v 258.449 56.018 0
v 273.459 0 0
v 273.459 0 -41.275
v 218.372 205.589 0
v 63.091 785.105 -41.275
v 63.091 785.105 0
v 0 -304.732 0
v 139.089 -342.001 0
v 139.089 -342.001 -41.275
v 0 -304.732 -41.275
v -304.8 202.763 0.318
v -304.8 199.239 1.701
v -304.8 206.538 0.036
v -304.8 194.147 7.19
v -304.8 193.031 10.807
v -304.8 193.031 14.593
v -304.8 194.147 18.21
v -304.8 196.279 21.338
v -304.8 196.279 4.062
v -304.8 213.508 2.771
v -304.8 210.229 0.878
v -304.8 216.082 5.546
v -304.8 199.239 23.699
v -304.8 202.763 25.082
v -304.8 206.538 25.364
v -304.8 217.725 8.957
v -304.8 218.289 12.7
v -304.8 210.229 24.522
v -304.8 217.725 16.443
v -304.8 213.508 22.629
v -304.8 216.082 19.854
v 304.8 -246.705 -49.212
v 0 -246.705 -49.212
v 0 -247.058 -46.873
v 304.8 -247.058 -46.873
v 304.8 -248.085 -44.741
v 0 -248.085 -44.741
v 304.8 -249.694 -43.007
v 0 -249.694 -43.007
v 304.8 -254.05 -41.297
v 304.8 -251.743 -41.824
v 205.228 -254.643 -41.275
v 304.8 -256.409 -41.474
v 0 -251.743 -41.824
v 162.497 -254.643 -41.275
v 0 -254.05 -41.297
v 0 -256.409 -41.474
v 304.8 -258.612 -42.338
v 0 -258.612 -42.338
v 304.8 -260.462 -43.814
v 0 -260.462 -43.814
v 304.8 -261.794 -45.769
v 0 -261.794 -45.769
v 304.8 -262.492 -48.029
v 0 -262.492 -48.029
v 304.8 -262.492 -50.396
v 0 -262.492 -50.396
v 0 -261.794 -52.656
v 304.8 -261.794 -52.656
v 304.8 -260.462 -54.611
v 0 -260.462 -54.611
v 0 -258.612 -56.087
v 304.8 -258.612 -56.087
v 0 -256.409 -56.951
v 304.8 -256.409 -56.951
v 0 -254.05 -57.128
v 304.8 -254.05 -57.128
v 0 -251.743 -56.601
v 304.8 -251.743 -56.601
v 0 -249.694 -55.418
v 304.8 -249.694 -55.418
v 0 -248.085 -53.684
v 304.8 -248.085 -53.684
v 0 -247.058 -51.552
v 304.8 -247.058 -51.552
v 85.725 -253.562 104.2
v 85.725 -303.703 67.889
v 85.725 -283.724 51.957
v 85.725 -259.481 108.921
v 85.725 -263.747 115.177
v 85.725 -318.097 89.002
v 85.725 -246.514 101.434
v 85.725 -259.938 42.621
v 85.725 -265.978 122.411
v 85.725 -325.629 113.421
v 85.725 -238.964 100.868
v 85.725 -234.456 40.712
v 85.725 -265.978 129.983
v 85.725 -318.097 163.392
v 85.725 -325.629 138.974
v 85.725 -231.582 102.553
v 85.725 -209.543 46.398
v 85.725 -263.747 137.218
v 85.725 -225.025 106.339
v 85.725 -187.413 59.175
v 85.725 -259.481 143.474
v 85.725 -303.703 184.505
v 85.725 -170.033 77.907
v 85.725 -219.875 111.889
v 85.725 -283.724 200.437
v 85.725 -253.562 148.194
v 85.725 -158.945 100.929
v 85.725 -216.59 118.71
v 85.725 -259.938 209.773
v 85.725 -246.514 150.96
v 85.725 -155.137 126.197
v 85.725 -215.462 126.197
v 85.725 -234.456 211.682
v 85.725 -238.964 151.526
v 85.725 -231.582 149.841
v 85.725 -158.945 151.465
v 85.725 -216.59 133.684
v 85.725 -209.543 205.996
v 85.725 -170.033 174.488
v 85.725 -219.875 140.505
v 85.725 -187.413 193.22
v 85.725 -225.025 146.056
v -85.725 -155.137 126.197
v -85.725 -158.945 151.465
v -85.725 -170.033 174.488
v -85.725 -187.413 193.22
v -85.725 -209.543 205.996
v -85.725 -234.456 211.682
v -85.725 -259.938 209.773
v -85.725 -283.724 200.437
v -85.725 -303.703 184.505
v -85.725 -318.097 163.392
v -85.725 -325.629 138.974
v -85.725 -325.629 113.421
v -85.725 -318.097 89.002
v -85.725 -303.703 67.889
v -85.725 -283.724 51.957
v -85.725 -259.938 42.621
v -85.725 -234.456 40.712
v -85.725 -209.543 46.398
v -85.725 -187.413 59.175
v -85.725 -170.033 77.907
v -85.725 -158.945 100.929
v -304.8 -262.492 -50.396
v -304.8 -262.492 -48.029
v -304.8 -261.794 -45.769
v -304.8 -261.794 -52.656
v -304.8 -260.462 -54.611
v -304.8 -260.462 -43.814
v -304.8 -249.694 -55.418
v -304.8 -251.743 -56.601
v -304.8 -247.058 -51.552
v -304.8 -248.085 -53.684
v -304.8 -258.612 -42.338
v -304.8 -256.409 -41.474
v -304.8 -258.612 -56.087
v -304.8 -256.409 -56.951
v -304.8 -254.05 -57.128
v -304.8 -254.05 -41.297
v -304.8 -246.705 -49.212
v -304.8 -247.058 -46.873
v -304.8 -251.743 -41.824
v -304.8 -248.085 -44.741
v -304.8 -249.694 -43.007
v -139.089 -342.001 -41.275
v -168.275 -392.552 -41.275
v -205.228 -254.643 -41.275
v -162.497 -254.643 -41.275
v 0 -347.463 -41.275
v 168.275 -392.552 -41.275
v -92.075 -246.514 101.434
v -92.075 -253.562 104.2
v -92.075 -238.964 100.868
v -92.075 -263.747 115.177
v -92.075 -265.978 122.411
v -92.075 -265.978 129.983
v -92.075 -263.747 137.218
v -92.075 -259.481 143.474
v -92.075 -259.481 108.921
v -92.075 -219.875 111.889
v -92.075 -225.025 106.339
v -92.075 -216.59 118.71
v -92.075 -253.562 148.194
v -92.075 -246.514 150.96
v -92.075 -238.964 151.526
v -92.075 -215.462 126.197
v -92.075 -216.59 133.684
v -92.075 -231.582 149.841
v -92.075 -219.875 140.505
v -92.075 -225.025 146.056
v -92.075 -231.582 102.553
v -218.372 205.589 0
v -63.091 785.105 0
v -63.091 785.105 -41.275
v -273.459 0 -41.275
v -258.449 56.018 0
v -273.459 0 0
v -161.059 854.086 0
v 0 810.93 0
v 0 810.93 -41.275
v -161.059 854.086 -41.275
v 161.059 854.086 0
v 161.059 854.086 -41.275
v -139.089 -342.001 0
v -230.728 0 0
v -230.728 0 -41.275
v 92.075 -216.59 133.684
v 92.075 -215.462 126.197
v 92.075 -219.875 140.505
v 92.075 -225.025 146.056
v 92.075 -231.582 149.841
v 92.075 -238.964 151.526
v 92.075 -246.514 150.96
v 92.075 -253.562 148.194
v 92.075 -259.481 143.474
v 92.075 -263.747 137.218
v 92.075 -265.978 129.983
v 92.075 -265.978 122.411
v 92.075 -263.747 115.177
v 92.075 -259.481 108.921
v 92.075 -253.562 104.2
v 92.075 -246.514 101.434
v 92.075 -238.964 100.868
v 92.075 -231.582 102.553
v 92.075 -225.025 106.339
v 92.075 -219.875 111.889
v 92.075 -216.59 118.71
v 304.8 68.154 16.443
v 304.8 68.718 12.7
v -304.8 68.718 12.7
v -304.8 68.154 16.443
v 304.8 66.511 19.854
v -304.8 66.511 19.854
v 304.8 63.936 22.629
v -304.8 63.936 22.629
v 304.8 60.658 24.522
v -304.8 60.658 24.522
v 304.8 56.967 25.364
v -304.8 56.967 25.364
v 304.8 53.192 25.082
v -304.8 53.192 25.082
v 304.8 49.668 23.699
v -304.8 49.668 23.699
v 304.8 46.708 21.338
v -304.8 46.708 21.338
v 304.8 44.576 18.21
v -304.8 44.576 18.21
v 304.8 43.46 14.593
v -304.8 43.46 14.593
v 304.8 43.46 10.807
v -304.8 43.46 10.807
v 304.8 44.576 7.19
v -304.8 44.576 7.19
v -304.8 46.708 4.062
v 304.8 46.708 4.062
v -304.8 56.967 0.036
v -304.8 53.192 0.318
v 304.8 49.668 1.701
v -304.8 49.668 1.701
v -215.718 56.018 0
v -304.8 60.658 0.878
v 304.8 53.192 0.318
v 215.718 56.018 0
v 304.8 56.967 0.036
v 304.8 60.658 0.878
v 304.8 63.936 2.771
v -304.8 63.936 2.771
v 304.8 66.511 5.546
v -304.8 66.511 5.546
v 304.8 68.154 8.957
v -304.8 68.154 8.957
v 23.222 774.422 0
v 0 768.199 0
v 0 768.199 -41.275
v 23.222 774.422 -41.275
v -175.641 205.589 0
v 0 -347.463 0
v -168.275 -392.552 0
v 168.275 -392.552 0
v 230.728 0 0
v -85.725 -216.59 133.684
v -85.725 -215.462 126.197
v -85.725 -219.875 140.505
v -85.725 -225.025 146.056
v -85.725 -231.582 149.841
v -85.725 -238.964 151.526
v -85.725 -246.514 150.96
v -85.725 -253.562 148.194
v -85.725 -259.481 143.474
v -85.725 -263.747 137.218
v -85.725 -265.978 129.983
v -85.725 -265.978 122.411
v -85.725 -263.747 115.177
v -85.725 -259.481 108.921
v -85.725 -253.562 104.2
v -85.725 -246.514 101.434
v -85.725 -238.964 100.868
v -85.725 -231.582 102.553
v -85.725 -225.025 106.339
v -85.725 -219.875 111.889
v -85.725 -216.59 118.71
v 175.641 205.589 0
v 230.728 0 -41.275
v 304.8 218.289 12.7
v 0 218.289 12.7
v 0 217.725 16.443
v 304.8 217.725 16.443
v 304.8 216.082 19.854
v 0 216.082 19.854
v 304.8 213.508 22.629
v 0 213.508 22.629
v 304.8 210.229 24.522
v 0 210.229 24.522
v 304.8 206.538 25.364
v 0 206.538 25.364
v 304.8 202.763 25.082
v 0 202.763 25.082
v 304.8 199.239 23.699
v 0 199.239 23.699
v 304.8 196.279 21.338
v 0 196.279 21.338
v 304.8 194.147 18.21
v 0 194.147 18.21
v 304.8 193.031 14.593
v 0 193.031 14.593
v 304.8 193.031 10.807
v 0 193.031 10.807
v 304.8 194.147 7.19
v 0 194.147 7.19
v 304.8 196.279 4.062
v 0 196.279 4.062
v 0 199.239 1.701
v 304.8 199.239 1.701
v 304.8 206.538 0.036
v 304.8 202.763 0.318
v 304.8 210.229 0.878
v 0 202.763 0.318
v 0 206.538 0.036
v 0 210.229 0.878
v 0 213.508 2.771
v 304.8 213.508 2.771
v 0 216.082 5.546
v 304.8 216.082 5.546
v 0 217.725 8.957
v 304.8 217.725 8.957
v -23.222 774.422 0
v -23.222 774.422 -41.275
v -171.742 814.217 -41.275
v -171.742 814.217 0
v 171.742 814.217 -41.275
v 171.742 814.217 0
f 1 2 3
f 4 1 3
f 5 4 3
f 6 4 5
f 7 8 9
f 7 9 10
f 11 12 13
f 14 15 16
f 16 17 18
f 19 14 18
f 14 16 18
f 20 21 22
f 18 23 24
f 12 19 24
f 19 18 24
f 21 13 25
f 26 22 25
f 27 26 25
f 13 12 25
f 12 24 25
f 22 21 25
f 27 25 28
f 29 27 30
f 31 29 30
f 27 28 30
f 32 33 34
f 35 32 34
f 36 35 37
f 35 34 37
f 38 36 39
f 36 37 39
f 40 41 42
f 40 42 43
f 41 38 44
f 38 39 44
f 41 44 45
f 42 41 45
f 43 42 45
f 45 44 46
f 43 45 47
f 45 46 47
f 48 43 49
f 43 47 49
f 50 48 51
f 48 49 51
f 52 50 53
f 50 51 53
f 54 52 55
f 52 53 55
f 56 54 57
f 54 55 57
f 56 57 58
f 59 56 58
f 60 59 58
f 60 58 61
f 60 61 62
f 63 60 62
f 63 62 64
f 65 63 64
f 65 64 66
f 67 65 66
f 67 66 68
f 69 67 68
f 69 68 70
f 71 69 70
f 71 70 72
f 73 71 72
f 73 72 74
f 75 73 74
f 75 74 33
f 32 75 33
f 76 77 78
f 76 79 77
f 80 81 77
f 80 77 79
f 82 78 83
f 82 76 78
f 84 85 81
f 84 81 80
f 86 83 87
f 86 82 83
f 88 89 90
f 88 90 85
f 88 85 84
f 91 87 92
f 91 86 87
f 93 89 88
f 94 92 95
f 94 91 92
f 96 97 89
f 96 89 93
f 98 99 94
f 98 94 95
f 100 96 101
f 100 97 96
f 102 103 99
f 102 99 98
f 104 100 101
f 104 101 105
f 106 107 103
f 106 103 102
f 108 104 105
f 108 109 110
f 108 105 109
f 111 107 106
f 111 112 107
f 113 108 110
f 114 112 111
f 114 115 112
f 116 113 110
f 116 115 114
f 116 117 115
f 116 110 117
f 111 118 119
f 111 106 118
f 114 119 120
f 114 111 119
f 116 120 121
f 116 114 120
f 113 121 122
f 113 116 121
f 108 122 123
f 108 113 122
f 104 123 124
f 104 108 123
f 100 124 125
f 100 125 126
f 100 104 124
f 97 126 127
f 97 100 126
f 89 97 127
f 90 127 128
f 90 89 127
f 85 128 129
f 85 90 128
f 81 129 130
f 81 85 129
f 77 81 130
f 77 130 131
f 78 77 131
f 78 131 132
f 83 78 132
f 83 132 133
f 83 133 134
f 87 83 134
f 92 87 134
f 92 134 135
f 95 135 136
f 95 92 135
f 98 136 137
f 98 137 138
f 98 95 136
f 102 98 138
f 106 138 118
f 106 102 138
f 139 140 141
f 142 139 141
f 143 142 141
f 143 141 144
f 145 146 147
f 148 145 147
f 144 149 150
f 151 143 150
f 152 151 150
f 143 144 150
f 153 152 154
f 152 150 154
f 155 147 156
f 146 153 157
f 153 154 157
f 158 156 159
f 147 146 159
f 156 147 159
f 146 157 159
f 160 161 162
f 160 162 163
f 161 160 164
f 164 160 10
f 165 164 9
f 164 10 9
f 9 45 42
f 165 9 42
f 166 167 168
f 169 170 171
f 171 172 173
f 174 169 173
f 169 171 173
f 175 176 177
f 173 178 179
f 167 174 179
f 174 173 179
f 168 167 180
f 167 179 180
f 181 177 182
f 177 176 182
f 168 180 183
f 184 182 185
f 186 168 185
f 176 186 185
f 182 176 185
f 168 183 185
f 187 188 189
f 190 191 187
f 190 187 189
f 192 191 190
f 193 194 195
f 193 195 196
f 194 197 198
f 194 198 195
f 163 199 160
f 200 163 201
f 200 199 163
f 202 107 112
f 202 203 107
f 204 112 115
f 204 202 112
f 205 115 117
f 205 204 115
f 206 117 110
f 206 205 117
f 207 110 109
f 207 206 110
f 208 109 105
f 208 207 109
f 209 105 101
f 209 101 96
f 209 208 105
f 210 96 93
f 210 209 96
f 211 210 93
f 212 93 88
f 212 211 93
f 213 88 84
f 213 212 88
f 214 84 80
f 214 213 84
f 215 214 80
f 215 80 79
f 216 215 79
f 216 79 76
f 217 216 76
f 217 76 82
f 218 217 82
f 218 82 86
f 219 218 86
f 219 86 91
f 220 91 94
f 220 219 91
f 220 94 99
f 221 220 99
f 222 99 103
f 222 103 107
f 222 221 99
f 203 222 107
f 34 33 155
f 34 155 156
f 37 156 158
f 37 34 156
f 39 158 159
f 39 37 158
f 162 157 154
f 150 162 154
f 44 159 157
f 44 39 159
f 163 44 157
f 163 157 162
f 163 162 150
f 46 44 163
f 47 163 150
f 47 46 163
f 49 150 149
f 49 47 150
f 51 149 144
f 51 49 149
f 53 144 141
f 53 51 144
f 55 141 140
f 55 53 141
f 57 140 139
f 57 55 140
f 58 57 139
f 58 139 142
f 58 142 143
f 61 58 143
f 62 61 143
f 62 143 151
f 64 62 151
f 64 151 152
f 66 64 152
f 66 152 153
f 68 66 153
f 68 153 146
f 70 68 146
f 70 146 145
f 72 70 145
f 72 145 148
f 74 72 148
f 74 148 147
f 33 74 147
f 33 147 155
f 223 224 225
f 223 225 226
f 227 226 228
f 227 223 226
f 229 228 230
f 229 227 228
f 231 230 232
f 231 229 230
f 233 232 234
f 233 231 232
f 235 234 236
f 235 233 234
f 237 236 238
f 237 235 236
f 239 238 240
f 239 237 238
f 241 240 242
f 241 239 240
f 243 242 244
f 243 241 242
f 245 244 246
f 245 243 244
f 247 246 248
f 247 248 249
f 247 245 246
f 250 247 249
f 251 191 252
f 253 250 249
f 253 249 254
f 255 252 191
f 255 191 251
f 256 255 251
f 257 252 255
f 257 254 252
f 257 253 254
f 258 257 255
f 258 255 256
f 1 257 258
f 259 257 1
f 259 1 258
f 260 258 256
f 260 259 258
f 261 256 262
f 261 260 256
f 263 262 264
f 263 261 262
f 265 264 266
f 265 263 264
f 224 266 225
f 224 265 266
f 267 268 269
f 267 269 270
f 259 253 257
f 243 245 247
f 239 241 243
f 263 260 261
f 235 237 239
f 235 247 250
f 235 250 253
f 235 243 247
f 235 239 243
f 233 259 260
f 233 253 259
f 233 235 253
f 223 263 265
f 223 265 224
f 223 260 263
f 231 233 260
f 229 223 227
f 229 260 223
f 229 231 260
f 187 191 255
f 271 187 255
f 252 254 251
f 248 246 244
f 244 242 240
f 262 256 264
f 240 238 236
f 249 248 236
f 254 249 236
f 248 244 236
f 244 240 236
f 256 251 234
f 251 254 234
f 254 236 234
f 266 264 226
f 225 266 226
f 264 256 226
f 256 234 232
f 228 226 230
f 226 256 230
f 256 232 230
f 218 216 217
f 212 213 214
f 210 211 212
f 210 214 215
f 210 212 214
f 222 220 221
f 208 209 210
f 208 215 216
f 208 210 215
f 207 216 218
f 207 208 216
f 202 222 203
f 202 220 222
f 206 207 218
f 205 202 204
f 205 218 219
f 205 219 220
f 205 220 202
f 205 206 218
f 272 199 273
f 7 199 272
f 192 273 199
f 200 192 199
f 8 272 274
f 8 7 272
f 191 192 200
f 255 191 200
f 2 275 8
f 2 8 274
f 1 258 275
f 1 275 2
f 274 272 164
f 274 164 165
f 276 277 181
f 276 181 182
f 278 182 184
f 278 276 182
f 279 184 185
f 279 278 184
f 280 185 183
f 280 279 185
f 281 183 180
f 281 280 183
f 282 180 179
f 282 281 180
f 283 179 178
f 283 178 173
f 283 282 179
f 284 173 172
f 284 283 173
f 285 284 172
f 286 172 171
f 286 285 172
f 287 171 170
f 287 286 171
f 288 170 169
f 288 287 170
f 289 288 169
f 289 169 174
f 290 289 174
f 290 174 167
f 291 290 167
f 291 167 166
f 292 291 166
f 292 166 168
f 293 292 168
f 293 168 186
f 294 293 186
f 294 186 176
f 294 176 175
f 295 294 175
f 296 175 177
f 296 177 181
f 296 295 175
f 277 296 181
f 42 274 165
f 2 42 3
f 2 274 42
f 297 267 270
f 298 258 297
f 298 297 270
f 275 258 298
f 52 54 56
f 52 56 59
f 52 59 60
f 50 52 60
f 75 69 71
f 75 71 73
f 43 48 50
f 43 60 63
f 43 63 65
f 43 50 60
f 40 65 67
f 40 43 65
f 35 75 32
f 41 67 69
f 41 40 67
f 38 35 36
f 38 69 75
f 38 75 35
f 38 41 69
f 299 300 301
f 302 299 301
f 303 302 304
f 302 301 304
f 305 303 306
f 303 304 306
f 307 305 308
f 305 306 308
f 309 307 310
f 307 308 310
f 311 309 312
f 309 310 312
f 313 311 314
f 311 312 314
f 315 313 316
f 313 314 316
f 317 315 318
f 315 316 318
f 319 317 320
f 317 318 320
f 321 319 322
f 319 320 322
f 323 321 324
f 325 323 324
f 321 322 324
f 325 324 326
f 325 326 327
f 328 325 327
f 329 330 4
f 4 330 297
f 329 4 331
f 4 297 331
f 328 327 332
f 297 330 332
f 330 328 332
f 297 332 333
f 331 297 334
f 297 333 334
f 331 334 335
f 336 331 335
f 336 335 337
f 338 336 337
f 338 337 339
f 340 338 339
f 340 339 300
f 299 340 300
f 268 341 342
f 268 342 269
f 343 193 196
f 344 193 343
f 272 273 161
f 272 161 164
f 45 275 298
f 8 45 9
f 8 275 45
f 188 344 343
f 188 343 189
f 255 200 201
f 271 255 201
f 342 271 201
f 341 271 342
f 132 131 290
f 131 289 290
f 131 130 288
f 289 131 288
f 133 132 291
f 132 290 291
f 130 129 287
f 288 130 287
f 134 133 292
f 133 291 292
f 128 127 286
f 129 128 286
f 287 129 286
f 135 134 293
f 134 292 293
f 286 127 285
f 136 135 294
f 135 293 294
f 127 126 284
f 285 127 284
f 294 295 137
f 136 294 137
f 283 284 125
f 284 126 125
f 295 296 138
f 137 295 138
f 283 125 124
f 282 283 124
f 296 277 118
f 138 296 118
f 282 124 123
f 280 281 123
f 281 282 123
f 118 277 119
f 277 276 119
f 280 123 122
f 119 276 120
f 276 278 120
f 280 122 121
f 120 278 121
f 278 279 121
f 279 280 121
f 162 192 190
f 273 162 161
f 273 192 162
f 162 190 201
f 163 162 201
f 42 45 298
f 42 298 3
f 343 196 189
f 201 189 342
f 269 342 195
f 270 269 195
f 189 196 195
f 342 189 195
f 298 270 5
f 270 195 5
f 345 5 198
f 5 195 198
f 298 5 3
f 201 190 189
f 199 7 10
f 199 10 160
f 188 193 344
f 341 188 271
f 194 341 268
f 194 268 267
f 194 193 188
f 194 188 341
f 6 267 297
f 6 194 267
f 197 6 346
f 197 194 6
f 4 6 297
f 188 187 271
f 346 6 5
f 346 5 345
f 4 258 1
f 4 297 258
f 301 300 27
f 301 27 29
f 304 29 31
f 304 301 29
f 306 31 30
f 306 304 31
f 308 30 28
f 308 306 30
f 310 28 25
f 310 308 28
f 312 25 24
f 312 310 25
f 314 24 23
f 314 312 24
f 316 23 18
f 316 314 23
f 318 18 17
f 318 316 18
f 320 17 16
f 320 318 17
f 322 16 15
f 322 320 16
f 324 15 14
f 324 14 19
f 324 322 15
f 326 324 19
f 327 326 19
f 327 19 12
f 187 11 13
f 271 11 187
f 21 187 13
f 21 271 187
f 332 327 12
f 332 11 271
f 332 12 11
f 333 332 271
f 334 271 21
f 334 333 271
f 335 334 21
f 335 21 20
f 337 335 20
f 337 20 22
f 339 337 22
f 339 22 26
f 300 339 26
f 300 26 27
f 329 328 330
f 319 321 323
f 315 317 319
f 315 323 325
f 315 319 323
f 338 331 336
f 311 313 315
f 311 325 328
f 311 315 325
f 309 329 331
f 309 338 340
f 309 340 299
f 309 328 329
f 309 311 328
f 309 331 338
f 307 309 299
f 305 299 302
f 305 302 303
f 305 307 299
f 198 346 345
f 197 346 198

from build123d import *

# Parameters (mm, degrees)
F2_DEPTH = 41.275
F3_R     = 85.725
F3_R_2   = 25.4
F4_DEPTH = 85.725
F5_DEPTH = 92.075
F3_R_3   = 12.7
F3_R_4   = 7.9375
F6_DEPTH = 304.8


with BuildPart() as f2:
    # F0 (on Top) → F2 (new body)
    with BuildSketch(Plane.XY):
        Polygon((0, -347.463105), (168.275, -392.552256), (273.45906, 0), (63.09094, 785.104512), (23.222352, 774.421756), (230.728036, 0), (139.089168, -342.000911), (0, -304.732081), (-139.089168, -342.000911), (-230.728036, 0), (-23.222352, 774.421756), (-63.09094, 785.104512), (-273.45906, 0), (-168.275, -392.552256), align=None)
        Polygon((23.222352, 774.421756), (63.09094, 785.104512), (171.741612, 814.217371), (161.058856, 854.08596), (0, 810.93037), (-161.058856, 854.08596), (-171.741612, 814.217371), (-63.09094, 785.104512), (-23.222352, 774.421756), (0, 768.199345), align=None)
    extrude(amount=-F2_DEPTH)

    # F3 (on Right) → F6 (join, symmetric)
    with BuildSketch(Plane.YZ):
        with Locations((205.58922, 12.7)):
            Circle(F3_R_3)
        with Locations((-254.642904, -49.2125)):
            Circle(F3_R_4)
        with Locations((56.017872, 12.7)):
            Circle(F3_R_3)
    extrude(amount=F6_DEPTH, both=True)


with BuildPart() as f4:
    # F3 (on Right) → F4 (new body, symmetric)
    with BuildSketch(Plane.YZ):
        with Locations((-240.861938, 126.19717)):
            Circle(F3_R)
        with Locations((-240.861938, 126.19717)):
            Circle(F3_R_2, mode=Mode.SUBTRACT)
    extrude(amount=F4_DEPTH, both=True)

    # F3 (on Right) → F5 (join, symmetric)
    with BuildSketch(Plane.YZ):
        with Locations((-240.861938, 126.19717)):
            Circle(F3_R_2)
    extrude(amount=F5_DEPTH, both=True)


solid = Compound([f2.part, f4.part])
